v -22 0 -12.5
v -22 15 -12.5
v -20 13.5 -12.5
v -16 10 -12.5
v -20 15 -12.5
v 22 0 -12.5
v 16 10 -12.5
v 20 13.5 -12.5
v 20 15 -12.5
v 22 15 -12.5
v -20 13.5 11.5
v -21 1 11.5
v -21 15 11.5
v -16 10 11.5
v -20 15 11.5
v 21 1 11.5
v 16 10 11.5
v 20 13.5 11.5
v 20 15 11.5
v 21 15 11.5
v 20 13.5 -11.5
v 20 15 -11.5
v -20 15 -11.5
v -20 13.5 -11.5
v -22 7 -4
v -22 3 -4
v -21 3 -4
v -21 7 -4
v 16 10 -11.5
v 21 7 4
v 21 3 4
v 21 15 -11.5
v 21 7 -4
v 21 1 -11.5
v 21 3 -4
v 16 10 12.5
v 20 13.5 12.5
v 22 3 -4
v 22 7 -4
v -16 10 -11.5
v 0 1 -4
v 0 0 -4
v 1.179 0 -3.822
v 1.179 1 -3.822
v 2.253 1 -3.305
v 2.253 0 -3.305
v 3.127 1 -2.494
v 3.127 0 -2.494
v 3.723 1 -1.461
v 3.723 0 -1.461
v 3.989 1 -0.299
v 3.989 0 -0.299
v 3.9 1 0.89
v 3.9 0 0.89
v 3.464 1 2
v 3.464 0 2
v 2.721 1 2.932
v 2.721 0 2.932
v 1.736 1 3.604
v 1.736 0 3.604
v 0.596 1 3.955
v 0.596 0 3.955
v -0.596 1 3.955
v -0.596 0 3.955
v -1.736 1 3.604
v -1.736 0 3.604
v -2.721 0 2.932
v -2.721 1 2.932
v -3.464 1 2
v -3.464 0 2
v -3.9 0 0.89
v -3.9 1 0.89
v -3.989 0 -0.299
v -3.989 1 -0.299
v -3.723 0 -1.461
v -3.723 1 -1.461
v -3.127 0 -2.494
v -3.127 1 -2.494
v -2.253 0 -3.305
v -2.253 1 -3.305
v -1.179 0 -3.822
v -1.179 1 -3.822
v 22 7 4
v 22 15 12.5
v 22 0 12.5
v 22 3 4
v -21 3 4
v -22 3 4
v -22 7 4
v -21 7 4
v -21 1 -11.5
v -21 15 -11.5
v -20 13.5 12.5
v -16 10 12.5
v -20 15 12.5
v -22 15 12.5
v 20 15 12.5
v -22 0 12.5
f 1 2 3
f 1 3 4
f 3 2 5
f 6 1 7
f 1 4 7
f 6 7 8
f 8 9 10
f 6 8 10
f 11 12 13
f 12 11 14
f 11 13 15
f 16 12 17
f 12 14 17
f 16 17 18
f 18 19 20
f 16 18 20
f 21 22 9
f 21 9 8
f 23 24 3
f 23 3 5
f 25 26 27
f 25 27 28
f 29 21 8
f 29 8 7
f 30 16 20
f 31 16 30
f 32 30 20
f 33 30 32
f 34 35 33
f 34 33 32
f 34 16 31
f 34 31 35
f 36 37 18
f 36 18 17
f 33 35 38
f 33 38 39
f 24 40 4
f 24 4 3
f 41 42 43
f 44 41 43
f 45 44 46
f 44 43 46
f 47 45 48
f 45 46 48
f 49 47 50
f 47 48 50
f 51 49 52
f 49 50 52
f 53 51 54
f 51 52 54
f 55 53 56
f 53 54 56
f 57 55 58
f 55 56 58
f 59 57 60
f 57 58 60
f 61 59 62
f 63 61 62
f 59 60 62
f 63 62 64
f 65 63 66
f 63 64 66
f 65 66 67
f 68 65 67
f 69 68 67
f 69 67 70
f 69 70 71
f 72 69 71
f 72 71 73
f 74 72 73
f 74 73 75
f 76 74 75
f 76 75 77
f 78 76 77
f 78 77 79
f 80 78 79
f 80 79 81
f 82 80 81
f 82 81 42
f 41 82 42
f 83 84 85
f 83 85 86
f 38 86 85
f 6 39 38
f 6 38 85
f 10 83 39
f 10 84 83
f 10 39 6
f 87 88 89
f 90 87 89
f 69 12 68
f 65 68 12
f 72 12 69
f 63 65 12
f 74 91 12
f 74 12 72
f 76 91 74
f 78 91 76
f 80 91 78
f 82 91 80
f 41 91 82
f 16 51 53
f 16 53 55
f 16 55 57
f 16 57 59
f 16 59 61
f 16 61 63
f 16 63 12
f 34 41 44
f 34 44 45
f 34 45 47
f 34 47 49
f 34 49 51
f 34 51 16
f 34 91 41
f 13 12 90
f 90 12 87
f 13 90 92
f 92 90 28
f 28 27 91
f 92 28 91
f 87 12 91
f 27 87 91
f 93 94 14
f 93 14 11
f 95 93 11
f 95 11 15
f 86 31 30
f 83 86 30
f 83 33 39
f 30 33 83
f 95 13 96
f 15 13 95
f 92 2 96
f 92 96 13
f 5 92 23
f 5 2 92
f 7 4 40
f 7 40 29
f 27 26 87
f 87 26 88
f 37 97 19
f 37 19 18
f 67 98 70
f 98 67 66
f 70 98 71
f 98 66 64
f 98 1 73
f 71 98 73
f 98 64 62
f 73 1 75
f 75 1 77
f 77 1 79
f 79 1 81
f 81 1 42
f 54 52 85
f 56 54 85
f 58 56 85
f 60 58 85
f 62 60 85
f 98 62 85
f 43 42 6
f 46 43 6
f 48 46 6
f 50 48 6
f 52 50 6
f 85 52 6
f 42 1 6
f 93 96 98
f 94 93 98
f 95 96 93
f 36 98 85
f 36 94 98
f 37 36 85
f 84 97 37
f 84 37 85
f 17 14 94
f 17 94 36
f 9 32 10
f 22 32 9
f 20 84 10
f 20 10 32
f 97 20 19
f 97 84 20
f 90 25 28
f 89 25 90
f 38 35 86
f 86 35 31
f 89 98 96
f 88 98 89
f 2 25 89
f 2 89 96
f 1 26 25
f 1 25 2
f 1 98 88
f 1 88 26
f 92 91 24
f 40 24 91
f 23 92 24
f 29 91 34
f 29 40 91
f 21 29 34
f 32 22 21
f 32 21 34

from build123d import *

# Parameters (mm, degrees)
CROQUIS1_W              = 44
CROQUIS1_H              = 25
SALIENTE_EXTRUIR2_DEPTH = 10
CROQUIS2_W              = 42
CROQUIS2_H              = 23
CORTAR_EXTRUIR1_DEPTH   = 9
SALIENTE_EXTRUIR3_DEPTH = 25
CROQUIS4_W              = 42
CROQUIS4_H              = 23
CORTAR_EXTRUIR2_DEPTH   = 28
CROQUIS5_W              = 1
CROQUIS5_H              = 23
CORTAR_EXTRUIR10_DEPTH  = 5
CROQUIS6_W              = 29.89343235
CROQUIS6_H              = 11.447342814
CORTAR_EXTRUIR11_DEPTH  = 1
CROQUIS7_W              = 31.003837105
CROQUIS7_H              = 9.868746677
CORTAR_EXTRUIR12_DEPTH  = 1
CROQUIS8_W              = 1
CROQUIS8_H              = 23
SALIENTE_EXTRUIR4_DEPTH = 5
CROQUIS9_W              = 8
CROQUIS9_H              = 4
CORTAR_EXTRUIR17_DEPTH  = 87
CROQUIS10_R             = 4
CORTAR_EXTRUIR19_DEPTH  = 10


with BuildPart() as part:
    # Croquis1 → Saliente-Extruir2 (new body)
    with BuildSketch(Plane(origin=(0, 0, 0), x_dir=(1, 0, 0), z_dir=(0, 1, 0))):
        Rectangle(CROQUIS1_W, CROQUIS1_H)
    extrude(amount=SALIENTE_EXTRUIR2_DEPTH)

    # Croquis2 → Cortar-Extruir1 (cut)
    with BuildSketch(Plane(origin=(0, 10, 0), x_dir=(1, 0, 0), z_dir=(0, 1, 0))):
        Rectangle(CROQUIS2_W, CROQUIS2_H)
    extrude(amount=-CORTAR_EXTRUIR1_DEPTH, mode=Mode.SUBTRACT)

    # Croquis3 → Saliente-Extruir3 (add)
    with BuildSketch(Plane.XY.offset(12.5)):
        Polygon((-22, 8), (-22, 10), (-16, 10), (-20, 13.5), (-20, 15), (-23, 15), (-23, 8), align=None)
        Polygon((20, 13.5), (16, 10), (22, 10), (22, 8), (23, 8), (23, 15), (20, 15), align=None)
    extrude(amount=-SALIENTE_EXTRUIR3_DEPTH)

    # Croquis4 → Cortar-Extruir2 (cut)
    with BuildSketch(Plane(origin=(0, 1, 0), x_dir=(1, 0, 0), z_dir=(0, 1, 0))):
        Rectangle(CROQUIS4_W, CROQUIS4_H)
    extrude(amount=CORTAR_EXTRUIR2_DEPTH, mode=Mode.SUBTRACT)

    # Croquis5 → Cortar-Extruir10 (cut)
    with BuildSketch(Plane(origin=(0, 15, 0), x_dir=(1, 0, 0), z_dir=(0, 1, 0))):
        with Locations((-21.5, 0)):
            Rectangle(CROQUIS5_W, CROQUIS5_H)
        with Locations((21.5, 0)):
            Rectangle(CROQUIS5_W, CROQUIS5_H)
    extrude(amount=-CORTAR_EXTRUIR10_DEPTH, mode=Mode.SUBTRACT)

    # Croquis6 → Cortar-Extruir11 (cut)
    with BuildSketch(Plane(origin=(23, 0, 0), x_dir=(0, 0, -1), z_dir=(1, 0, 0))):
        with Locations((-0.524699003, 11.114026003)):
            Rectangle(CROQUIS6_W, CROQUIS6_H)
    extrude(amount=-CORTAR_EXTRUIR11_DEPTH, mode=Mode.SUBTRACT)

    # Croquis7 → Cortar-Extruir12 (cut)
    with BuildSketch(Plane.ZY.offset(23)):
        with Locations((-0.729719636, 12.255463236)):
            Rectangle(CROQUIS7_W, CROQUIS7_H)
    extrude(amount=-CORTAR_EXTRUIR12_DEPTH, mode=Mode.SUBTRACT)

    # Croquis8 → Saliente-Extruir4 (add)
    with BuildSketch(Plane(origin=(0, 10, 0), x_dir=(1, 0, 0), z_dir=(0, 1, 0))):
        with Locations((-21.5, 0)):
            Rectangle(CROQUIS8_W, CROQUIS8_H)
        with Locations((21.5, 0)):
            Rectangle(CROQUIS8_W, CROQUIS8_H)
    extrude(amount=SALIENTE_EXTRUIR4_DEPTH)

    # Croquis9 → Cortar-Extruir17 (cut)
    with BuildSketch(Plane.ZY.offset(22)):
        with Locations((0, 5)):
            Rectangle(CROQUIS9_W, CROQUIS9_H)
    extrude(amount=-CORTAR_EXTRUIR17_DEPTH, mode=Mode.SUBTRACT)

    # Croquis10 → Cortar-Extruir19 (cut)
    with BuildSketch(Plane.XZ):
        Circle(CROQUIS10_R)
    extrude(amount=-CORTAR_EXTRUIR19_DEPTH, mode=Mode.SUBTRACT)


solid = part.part
